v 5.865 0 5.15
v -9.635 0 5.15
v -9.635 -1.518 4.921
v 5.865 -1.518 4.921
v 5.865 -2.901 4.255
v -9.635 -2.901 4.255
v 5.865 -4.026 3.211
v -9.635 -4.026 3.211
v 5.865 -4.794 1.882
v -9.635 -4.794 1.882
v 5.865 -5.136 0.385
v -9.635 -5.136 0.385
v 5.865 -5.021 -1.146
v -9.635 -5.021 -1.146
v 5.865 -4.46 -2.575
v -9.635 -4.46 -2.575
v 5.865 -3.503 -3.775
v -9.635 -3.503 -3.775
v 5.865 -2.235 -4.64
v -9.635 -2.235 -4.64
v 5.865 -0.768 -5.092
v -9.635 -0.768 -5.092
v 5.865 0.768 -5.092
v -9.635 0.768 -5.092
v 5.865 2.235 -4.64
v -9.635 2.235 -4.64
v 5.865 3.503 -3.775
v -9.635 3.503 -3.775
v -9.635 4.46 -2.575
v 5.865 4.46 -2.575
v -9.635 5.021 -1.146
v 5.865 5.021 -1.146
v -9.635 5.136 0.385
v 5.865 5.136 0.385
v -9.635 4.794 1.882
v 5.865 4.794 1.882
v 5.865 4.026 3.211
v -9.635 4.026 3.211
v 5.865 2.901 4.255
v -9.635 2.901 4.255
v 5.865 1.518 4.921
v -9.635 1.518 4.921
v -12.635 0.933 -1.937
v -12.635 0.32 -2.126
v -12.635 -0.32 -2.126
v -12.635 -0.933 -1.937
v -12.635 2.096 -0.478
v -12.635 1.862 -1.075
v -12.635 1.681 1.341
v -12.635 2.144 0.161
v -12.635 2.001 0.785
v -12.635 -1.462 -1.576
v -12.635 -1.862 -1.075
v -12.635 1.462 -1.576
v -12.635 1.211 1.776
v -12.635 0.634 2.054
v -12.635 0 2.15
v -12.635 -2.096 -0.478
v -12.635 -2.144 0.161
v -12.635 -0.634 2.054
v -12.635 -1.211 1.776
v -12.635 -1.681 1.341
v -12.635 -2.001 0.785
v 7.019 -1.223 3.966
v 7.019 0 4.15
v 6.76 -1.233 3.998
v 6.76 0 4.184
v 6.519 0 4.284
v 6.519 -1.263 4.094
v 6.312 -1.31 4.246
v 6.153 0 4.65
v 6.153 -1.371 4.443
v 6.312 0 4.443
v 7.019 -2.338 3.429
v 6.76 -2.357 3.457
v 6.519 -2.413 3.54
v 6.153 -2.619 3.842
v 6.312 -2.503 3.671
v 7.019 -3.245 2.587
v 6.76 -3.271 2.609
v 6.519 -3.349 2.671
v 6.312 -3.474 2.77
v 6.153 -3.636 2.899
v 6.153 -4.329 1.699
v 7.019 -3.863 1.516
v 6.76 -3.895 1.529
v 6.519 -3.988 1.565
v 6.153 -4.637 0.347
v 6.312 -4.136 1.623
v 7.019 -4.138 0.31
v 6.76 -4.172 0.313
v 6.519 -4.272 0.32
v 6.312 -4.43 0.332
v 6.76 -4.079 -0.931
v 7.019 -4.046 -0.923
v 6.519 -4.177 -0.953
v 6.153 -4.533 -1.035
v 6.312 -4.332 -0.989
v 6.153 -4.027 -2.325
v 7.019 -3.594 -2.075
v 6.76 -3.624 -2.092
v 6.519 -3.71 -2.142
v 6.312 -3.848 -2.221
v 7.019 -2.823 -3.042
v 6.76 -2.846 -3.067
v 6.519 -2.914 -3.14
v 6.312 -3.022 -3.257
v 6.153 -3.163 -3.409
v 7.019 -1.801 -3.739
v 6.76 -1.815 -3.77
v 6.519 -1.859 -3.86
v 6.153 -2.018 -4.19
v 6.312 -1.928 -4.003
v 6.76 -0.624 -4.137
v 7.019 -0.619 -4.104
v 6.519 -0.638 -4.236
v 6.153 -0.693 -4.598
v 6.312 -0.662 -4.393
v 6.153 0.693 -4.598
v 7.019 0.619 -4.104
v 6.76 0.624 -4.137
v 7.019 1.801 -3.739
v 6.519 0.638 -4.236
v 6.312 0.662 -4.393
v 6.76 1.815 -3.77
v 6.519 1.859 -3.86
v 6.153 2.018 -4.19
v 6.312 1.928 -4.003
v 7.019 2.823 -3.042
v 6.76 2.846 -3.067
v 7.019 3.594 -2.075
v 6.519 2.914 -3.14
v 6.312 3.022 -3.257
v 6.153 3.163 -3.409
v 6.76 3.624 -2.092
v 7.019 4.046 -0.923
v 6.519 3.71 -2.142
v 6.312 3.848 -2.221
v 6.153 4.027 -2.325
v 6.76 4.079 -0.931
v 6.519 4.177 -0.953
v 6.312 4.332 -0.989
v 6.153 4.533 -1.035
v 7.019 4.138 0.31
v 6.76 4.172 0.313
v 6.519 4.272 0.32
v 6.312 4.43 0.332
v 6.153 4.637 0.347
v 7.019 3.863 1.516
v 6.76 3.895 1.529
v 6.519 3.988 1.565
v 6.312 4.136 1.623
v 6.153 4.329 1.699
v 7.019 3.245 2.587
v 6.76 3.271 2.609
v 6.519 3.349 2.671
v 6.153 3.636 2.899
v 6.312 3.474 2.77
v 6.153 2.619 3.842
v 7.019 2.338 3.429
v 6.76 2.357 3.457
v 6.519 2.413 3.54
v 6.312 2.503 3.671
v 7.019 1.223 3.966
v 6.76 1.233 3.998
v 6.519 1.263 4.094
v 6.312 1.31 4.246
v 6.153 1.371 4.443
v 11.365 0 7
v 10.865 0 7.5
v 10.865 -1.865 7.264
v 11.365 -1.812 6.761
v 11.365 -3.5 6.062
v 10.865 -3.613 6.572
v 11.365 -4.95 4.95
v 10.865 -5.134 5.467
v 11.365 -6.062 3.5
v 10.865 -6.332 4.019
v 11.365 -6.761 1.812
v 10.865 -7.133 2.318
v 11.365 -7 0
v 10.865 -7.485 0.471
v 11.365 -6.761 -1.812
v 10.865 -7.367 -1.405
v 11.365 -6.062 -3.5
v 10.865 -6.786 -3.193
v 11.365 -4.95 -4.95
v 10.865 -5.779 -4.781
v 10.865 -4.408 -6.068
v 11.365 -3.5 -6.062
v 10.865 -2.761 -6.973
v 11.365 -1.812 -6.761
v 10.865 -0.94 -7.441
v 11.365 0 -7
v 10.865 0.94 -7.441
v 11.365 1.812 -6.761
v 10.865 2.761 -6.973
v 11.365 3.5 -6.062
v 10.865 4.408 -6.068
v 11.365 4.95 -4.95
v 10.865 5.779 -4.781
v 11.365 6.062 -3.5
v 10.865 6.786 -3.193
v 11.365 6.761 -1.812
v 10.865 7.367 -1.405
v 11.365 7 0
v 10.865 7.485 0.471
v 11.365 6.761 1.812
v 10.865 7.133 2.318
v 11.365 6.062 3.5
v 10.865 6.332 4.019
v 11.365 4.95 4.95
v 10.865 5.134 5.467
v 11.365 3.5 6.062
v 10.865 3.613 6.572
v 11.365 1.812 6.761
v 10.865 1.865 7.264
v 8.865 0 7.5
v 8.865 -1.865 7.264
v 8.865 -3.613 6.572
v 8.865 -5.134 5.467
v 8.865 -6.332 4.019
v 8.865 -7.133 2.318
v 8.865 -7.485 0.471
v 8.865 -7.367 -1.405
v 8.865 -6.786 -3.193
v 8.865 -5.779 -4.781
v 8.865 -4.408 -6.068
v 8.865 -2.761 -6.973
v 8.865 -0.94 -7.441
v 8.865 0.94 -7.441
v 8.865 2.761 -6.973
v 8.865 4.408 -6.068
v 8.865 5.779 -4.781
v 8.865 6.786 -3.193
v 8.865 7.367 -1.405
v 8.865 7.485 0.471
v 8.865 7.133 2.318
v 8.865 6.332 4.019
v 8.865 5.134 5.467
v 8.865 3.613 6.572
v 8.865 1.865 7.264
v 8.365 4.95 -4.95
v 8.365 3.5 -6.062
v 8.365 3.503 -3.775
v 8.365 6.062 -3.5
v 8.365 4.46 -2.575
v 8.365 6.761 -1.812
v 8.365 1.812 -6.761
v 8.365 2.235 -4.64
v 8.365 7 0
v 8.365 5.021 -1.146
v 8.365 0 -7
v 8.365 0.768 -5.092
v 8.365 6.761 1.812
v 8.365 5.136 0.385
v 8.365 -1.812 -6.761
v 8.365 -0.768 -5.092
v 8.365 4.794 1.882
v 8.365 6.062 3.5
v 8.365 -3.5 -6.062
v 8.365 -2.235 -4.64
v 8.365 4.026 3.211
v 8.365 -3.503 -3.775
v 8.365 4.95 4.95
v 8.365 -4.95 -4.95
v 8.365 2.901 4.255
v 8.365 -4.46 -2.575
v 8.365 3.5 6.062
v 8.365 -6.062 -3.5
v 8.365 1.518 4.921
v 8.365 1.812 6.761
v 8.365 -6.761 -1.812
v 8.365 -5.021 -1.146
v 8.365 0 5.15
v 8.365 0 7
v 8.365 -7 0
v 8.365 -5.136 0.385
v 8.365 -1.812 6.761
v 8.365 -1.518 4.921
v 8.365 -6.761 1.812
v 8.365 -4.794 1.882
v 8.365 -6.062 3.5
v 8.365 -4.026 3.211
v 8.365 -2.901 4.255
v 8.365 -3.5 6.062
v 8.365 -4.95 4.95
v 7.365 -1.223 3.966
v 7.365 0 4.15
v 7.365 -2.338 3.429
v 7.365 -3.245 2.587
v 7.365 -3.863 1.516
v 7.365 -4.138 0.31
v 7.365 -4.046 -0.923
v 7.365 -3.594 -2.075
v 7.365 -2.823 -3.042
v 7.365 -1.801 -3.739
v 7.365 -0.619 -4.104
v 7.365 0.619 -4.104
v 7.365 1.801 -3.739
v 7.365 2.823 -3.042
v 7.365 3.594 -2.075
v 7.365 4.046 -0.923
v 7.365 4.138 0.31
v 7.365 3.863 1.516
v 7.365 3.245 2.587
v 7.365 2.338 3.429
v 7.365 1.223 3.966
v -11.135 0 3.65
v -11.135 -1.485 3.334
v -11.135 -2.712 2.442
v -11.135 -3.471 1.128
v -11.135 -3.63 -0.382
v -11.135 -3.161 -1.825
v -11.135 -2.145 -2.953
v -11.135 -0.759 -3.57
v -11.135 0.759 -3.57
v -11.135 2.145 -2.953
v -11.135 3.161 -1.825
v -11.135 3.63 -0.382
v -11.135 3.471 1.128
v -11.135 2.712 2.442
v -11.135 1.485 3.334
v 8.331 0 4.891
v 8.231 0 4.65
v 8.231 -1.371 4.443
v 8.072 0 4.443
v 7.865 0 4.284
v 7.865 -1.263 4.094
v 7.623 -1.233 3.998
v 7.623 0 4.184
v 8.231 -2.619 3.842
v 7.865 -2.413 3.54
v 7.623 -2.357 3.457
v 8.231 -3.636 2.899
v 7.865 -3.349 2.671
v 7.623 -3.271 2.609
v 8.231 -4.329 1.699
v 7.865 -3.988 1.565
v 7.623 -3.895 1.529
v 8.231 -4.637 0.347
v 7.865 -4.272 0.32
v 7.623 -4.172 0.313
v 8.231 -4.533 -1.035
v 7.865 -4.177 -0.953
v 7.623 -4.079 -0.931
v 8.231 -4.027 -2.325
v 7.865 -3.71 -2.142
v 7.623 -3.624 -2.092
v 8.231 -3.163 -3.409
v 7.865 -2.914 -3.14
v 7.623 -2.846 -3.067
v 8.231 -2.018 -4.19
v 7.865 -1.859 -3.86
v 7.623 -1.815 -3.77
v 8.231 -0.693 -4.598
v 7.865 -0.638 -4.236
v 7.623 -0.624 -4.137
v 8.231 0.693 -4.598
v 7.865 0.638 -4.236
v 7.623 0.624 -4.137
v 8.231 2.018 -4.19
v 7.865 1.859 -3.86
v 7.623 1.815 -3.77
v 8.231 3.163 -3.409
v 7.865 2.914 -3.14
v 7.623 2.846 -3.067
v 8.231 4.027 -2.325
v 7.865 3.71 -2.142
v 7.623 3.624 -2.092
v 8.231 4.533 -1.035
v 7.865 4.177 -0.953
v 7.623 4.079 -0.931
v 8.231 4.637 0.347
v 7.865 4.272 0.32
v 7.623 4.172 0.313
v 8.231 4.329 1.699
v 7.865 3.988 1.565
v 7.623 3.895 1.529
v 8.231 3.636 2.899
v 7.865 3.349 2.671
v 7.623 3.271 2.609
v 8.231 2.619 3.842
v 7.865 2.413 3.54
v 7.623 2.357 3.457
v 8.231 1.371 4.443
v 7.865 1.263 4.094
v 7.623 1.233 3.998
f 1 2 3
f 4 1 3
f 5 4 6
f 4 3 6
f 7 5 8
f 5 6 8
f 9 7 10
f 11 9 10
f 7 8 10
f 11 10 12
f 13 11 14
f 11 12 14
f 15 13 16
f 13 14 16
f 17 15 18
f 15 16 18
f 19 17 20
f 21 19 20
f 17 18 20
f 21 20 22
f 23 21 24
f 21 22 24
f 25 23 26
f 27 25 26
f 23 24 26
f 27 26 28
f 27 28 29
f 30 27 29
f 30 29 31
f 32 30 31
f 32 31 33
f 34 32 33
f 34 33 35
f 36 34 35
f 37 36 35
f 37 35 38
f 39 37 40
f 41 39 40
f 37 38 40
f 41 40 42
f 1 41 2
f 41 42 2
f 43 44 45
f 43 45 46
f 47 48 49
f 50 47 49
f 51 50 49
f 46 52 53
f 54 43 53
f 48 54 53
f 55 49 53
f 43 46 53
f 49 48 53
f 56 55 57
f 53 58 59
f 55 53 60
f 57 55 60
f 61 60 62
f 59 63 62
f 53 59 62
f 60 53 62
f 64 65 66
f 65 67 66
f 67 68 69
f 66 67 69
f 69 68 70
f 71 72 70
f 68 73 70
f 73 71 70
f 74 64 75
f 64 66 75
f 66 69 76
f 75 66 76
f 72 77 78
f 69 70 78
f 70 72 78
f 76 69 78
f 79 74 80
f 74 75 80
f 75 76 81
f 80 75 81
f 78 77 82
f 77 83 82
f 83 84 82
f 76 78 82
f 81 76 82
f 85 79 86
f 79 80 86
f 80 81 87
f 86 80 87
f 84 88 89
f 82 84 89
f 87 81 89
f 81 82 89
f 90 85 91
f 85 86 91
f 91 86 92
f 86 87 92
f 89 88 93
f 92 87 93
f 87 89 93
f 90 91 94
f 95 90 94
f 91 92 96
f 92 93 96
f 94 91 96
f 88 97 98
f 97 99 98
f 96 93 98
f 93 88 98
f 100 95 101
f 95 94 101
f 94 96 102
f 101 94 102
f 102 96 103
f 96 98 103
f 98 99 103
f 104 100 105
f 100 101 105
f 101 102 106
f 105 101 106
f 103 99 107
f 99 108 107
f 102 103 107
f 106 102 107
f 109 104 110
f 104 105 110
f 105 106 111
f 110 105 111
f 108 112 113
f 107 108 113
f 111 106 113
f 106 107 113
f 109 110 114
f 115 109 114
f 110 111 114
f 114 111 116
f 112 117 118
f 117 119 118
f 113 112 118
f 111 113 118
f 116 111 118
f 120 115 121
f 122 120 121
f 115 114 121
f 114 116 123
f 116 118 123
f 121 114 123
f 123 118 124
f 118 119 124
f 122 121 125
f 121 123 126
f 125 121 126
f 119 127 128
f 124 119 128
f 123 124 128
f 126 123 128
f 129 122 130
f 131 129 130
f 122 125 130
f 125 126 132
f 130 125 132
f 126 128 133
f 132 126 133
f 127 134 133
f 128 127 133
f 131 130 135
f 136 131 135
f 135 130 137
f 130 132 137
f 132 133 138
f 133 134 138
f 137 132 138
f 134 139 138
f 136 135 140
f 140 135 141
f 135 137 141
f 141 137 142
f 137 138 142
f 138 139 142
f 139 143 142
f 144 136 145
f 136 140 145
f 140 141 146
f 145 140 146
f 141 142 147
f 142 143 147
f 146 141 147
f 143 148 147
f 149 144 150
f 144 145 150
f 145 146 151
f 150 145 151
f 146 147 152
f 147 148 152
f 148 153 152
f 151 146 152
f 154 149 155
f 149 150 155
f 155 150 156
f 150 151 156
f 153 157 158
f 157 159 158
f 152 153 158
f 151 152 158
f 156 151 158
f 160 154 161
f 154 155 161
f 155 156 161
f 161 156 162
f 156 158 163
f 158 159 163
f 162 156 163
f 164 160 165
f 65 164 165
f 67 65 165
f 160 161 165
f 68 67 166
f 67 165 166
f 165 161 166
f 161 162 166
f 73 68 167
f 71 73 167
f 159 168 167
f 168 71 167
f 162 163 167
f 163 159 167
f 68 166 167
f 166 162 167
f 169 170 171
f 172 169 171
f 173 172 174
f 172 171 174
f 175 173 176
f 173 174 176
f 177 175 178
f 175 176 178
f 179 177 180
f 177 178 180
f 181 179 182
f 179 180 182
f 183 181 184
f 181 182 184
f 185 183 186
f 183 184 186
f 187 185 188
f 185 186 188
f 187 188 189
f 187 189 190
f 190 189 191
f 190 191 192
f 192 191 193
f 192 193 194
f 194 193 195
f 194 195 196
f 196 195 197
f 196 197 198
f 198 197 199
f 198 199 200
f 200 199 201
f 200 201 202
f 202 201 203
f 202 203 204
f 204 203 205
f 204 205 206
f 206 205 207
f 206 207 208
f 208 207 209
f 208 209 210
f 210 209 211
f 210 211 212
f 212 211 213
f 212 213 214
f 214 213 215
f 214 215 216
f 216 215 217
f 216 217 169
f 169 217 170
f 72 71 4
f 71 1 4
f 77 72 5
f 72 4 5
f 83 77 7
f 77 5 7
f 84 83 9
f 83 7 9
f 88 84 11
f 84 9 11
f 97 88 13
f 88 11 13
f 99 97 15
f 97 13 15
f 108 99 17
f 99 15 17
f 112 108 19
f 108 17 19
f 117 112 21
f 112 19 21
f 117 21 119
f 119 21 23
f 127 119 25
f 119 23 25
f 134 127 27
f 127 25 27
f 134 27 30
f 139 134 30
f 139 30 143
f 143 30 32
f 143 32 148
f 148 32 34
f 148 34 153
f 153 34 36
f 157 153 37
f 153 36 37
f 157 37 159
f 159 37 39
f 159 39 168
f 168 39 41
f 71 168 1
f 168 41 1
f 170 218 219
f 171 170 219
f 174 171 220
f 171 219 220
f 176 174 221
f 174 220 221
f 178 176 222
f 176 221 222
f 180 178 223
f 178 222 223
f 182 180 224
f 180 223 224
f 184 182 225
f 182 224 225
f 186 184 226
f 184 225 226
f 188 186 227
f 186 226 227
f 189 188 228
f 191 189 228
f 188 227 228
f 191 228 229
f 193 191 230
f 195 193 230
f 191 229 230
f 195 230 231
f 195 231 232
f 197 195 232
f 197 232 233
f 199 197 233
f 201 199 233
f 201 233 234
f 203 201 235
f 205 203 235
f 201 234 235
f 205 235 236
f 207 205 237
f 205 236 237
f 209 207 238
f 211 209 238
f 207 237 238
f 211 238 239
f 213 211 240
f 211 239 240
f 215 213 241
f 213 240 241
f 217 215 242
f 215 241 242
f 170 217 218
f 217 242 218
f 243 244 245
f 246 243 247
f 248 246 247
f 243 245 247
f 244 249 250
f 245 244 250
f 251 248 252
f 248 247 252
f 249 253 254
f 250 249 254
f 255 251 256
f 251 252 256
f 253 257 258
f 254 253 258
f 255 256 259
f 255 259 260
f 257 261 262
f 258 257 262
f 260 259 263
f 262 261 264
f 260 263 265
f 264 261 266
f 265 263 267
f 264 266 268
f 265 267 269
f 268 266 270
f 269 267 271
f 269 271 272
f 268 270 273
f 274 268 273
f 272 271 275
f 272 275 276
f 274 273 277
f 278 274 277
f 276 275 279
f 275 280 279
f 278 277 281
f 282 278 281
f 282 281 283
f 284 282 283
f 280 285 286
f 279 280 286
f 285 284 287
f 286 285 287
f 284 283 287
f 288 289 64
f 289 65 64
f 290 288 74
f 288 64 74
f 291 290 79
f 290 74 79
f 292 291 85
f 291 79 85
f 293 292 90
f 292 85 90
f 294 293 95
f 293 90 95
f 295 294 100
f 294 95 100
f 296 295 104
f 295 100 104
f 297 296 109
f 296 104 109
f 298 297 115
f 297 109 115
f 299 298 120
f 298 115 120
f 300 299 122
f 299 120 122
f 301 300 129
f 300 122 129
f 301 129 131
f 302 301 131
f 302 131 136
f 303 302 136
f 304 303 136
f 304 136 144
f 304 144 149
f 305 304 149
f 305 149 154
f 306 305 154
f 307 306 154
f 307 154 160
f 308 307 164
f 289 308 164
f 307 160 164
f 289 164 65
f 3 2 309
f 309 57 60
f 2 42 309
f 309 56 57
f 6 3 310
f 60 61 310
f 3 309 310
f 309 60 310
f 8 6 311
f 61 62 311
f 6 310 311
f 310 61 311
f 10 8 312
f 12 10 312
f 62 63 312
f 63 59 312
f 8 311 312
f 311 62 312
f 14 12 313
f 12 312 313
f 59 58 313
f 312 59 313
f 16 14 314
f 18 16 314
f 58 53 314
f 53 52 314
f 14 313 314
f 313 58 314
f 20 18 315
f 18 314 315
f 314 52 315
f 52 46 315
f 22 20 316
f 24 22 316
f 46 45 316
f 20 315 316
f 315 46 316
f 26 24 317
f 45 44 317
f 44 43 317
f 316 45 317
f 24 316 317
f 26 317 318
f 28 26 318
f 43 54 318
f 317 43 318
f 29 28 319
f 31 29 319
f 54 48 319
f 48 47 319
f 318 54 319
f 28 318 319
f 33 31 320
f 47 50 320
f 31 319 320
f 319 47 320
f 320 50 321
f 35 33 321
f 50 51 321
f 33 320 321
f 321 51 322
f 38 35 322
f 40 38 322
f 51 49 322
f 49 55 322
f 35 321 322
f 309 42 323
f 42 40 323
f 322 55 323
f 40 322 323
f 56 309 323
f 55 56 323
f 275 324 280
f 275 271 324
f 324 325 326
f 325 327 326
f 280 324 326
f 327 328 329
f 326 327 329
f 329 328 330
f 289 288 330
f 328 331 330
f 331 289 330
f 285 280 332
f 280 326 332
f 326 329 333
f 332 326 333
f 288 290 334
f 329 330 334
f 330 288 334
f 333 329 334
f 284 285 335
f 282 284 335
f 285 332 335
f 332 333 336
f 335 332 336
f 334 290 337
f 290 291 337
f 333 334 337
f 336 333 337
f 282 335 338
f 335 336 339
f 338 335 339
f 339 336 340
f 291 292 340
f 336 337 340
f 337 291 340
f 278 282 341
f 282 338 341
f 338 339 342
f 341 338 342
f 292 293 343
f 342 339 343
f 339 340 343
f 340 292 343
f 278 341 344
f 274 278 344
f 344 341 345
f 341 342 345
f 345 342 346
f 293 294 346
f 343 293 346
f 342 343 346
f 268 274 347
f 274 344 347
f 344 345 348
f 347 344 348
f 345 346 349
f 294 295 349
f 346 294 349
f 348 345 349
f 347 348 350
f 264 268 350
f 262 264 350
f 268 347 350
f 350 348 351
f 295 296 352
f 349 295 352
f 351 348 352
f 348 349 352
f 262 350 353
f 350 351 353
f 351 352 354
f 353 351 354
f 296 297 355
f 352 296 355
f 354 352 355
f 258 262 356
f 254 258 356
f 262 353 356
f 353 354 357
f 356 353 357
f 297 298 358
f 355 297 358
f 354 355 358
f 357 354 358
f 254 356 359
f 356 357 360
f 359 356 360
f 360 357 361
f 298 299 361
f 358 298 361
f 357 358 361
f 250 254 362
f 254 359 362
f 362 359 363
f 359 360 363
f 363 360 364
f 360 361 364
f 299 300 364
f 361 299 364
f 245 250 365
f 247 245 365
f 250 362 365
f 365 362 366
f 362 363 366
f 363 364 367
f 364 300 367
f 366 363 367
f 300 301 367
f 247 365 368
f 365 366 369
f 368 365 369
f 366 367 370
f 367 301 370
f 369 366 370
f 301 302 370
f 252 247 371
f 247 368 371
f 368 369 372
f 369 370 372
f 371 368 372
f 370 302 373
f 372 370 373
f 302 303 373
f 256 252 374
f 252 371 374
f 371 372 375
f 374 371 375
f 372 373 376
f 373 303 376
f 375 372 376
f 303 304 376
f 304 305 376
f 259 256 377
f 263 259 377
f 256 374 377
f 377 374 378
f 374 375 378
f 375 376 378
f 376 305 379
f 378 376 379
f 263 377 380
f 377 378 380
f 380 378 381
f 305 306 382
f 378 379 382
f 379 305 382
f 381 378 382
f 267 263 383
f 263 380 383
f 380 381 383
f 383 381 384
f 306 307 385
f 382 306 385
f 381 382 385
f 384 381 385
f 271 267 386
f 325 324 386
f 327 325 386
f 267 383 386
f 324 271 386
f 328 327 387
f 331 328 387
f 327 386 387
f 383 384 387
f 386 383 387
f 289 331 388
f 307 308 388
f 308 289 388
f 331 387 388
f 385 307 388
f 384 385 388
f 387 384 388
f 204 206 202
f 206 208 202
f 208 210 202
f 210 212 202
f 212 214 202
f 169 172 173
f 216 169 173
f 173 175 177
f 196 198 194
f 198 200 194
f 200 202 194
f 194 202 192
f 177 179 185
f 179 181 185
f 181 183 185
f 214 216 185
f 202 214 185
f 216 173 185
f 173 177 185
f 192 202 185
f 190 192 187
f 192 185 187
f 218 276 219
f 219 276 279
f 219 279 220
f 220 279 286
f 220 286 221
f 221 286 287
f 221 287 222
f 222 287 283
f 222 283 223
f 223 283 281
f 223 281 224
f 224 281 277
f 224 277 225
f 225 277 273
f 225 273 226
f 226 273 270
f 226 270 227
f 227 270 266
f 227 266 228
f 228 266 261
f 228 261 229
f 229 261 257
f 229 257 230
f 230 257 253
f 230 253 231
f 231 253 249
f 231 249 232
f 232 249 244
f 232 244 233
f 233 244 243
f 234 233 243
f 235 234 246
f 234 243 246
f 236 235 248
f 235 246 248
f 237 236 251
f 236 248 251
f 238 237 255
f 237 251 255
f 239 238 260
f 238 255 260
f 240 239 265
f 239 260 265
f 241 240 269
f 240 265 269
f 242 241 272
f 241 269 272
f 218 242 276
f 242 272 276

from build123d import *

# Parameters (mm, degrees)
F2_SIZE = 0.5
F3_SIZE = 3


with BuildPart() as f1:
    # F0 (on Front) → F1 (revolve)
    with BuildSketch(Plane.XZ):
        with BuildLine():
            Line((-12.635403, 5.15), (-12.635403, 0))
            Line((-12.635403, 0), (11.364597, 0))
            Line((11.364597, 0), (11.364597, 7.5))
            Line((11.364597, 7.5), (8.364597, 7.5))
            Line((8.364597, 7.5), (8.364597, 5.15))
            ThreePointArc((8.364597, 5.15), (8.071704, 4.442893), (7.364597, 4.15))
            Line((7.364597, 4.15), (7.019298, 4.15))
            ThreePointArc((7.019298, 4.15), (6.519298, 4.283975), (6.153272, 4.65))
            Line((6.153272, 4.65), (5.864597, 5.15))
            Line((5.864597, 5.15), (-12.635403, 5.15))
        make_face()
    revolve(axis=Axis((-0.635403, 0, 0), (1, 0, 0)))

    # F2
    f2_edges = [f1.edges().sort_by_distance(p)[0] for p in [
        (11.364597, 0, -7.5),
        (8.364597, 0, -7.5),
    ]]
    chamfer(f2_edges, length=F2_SIZE)

    # F3
    f3_edges = [f1.edges().sort_by_distance(p)[0] for p in [
        (-12.635403, 0, -5.15),
    ]]
    chamfer(f3_edges, length=F3_SIZE)


solid = f1.part
